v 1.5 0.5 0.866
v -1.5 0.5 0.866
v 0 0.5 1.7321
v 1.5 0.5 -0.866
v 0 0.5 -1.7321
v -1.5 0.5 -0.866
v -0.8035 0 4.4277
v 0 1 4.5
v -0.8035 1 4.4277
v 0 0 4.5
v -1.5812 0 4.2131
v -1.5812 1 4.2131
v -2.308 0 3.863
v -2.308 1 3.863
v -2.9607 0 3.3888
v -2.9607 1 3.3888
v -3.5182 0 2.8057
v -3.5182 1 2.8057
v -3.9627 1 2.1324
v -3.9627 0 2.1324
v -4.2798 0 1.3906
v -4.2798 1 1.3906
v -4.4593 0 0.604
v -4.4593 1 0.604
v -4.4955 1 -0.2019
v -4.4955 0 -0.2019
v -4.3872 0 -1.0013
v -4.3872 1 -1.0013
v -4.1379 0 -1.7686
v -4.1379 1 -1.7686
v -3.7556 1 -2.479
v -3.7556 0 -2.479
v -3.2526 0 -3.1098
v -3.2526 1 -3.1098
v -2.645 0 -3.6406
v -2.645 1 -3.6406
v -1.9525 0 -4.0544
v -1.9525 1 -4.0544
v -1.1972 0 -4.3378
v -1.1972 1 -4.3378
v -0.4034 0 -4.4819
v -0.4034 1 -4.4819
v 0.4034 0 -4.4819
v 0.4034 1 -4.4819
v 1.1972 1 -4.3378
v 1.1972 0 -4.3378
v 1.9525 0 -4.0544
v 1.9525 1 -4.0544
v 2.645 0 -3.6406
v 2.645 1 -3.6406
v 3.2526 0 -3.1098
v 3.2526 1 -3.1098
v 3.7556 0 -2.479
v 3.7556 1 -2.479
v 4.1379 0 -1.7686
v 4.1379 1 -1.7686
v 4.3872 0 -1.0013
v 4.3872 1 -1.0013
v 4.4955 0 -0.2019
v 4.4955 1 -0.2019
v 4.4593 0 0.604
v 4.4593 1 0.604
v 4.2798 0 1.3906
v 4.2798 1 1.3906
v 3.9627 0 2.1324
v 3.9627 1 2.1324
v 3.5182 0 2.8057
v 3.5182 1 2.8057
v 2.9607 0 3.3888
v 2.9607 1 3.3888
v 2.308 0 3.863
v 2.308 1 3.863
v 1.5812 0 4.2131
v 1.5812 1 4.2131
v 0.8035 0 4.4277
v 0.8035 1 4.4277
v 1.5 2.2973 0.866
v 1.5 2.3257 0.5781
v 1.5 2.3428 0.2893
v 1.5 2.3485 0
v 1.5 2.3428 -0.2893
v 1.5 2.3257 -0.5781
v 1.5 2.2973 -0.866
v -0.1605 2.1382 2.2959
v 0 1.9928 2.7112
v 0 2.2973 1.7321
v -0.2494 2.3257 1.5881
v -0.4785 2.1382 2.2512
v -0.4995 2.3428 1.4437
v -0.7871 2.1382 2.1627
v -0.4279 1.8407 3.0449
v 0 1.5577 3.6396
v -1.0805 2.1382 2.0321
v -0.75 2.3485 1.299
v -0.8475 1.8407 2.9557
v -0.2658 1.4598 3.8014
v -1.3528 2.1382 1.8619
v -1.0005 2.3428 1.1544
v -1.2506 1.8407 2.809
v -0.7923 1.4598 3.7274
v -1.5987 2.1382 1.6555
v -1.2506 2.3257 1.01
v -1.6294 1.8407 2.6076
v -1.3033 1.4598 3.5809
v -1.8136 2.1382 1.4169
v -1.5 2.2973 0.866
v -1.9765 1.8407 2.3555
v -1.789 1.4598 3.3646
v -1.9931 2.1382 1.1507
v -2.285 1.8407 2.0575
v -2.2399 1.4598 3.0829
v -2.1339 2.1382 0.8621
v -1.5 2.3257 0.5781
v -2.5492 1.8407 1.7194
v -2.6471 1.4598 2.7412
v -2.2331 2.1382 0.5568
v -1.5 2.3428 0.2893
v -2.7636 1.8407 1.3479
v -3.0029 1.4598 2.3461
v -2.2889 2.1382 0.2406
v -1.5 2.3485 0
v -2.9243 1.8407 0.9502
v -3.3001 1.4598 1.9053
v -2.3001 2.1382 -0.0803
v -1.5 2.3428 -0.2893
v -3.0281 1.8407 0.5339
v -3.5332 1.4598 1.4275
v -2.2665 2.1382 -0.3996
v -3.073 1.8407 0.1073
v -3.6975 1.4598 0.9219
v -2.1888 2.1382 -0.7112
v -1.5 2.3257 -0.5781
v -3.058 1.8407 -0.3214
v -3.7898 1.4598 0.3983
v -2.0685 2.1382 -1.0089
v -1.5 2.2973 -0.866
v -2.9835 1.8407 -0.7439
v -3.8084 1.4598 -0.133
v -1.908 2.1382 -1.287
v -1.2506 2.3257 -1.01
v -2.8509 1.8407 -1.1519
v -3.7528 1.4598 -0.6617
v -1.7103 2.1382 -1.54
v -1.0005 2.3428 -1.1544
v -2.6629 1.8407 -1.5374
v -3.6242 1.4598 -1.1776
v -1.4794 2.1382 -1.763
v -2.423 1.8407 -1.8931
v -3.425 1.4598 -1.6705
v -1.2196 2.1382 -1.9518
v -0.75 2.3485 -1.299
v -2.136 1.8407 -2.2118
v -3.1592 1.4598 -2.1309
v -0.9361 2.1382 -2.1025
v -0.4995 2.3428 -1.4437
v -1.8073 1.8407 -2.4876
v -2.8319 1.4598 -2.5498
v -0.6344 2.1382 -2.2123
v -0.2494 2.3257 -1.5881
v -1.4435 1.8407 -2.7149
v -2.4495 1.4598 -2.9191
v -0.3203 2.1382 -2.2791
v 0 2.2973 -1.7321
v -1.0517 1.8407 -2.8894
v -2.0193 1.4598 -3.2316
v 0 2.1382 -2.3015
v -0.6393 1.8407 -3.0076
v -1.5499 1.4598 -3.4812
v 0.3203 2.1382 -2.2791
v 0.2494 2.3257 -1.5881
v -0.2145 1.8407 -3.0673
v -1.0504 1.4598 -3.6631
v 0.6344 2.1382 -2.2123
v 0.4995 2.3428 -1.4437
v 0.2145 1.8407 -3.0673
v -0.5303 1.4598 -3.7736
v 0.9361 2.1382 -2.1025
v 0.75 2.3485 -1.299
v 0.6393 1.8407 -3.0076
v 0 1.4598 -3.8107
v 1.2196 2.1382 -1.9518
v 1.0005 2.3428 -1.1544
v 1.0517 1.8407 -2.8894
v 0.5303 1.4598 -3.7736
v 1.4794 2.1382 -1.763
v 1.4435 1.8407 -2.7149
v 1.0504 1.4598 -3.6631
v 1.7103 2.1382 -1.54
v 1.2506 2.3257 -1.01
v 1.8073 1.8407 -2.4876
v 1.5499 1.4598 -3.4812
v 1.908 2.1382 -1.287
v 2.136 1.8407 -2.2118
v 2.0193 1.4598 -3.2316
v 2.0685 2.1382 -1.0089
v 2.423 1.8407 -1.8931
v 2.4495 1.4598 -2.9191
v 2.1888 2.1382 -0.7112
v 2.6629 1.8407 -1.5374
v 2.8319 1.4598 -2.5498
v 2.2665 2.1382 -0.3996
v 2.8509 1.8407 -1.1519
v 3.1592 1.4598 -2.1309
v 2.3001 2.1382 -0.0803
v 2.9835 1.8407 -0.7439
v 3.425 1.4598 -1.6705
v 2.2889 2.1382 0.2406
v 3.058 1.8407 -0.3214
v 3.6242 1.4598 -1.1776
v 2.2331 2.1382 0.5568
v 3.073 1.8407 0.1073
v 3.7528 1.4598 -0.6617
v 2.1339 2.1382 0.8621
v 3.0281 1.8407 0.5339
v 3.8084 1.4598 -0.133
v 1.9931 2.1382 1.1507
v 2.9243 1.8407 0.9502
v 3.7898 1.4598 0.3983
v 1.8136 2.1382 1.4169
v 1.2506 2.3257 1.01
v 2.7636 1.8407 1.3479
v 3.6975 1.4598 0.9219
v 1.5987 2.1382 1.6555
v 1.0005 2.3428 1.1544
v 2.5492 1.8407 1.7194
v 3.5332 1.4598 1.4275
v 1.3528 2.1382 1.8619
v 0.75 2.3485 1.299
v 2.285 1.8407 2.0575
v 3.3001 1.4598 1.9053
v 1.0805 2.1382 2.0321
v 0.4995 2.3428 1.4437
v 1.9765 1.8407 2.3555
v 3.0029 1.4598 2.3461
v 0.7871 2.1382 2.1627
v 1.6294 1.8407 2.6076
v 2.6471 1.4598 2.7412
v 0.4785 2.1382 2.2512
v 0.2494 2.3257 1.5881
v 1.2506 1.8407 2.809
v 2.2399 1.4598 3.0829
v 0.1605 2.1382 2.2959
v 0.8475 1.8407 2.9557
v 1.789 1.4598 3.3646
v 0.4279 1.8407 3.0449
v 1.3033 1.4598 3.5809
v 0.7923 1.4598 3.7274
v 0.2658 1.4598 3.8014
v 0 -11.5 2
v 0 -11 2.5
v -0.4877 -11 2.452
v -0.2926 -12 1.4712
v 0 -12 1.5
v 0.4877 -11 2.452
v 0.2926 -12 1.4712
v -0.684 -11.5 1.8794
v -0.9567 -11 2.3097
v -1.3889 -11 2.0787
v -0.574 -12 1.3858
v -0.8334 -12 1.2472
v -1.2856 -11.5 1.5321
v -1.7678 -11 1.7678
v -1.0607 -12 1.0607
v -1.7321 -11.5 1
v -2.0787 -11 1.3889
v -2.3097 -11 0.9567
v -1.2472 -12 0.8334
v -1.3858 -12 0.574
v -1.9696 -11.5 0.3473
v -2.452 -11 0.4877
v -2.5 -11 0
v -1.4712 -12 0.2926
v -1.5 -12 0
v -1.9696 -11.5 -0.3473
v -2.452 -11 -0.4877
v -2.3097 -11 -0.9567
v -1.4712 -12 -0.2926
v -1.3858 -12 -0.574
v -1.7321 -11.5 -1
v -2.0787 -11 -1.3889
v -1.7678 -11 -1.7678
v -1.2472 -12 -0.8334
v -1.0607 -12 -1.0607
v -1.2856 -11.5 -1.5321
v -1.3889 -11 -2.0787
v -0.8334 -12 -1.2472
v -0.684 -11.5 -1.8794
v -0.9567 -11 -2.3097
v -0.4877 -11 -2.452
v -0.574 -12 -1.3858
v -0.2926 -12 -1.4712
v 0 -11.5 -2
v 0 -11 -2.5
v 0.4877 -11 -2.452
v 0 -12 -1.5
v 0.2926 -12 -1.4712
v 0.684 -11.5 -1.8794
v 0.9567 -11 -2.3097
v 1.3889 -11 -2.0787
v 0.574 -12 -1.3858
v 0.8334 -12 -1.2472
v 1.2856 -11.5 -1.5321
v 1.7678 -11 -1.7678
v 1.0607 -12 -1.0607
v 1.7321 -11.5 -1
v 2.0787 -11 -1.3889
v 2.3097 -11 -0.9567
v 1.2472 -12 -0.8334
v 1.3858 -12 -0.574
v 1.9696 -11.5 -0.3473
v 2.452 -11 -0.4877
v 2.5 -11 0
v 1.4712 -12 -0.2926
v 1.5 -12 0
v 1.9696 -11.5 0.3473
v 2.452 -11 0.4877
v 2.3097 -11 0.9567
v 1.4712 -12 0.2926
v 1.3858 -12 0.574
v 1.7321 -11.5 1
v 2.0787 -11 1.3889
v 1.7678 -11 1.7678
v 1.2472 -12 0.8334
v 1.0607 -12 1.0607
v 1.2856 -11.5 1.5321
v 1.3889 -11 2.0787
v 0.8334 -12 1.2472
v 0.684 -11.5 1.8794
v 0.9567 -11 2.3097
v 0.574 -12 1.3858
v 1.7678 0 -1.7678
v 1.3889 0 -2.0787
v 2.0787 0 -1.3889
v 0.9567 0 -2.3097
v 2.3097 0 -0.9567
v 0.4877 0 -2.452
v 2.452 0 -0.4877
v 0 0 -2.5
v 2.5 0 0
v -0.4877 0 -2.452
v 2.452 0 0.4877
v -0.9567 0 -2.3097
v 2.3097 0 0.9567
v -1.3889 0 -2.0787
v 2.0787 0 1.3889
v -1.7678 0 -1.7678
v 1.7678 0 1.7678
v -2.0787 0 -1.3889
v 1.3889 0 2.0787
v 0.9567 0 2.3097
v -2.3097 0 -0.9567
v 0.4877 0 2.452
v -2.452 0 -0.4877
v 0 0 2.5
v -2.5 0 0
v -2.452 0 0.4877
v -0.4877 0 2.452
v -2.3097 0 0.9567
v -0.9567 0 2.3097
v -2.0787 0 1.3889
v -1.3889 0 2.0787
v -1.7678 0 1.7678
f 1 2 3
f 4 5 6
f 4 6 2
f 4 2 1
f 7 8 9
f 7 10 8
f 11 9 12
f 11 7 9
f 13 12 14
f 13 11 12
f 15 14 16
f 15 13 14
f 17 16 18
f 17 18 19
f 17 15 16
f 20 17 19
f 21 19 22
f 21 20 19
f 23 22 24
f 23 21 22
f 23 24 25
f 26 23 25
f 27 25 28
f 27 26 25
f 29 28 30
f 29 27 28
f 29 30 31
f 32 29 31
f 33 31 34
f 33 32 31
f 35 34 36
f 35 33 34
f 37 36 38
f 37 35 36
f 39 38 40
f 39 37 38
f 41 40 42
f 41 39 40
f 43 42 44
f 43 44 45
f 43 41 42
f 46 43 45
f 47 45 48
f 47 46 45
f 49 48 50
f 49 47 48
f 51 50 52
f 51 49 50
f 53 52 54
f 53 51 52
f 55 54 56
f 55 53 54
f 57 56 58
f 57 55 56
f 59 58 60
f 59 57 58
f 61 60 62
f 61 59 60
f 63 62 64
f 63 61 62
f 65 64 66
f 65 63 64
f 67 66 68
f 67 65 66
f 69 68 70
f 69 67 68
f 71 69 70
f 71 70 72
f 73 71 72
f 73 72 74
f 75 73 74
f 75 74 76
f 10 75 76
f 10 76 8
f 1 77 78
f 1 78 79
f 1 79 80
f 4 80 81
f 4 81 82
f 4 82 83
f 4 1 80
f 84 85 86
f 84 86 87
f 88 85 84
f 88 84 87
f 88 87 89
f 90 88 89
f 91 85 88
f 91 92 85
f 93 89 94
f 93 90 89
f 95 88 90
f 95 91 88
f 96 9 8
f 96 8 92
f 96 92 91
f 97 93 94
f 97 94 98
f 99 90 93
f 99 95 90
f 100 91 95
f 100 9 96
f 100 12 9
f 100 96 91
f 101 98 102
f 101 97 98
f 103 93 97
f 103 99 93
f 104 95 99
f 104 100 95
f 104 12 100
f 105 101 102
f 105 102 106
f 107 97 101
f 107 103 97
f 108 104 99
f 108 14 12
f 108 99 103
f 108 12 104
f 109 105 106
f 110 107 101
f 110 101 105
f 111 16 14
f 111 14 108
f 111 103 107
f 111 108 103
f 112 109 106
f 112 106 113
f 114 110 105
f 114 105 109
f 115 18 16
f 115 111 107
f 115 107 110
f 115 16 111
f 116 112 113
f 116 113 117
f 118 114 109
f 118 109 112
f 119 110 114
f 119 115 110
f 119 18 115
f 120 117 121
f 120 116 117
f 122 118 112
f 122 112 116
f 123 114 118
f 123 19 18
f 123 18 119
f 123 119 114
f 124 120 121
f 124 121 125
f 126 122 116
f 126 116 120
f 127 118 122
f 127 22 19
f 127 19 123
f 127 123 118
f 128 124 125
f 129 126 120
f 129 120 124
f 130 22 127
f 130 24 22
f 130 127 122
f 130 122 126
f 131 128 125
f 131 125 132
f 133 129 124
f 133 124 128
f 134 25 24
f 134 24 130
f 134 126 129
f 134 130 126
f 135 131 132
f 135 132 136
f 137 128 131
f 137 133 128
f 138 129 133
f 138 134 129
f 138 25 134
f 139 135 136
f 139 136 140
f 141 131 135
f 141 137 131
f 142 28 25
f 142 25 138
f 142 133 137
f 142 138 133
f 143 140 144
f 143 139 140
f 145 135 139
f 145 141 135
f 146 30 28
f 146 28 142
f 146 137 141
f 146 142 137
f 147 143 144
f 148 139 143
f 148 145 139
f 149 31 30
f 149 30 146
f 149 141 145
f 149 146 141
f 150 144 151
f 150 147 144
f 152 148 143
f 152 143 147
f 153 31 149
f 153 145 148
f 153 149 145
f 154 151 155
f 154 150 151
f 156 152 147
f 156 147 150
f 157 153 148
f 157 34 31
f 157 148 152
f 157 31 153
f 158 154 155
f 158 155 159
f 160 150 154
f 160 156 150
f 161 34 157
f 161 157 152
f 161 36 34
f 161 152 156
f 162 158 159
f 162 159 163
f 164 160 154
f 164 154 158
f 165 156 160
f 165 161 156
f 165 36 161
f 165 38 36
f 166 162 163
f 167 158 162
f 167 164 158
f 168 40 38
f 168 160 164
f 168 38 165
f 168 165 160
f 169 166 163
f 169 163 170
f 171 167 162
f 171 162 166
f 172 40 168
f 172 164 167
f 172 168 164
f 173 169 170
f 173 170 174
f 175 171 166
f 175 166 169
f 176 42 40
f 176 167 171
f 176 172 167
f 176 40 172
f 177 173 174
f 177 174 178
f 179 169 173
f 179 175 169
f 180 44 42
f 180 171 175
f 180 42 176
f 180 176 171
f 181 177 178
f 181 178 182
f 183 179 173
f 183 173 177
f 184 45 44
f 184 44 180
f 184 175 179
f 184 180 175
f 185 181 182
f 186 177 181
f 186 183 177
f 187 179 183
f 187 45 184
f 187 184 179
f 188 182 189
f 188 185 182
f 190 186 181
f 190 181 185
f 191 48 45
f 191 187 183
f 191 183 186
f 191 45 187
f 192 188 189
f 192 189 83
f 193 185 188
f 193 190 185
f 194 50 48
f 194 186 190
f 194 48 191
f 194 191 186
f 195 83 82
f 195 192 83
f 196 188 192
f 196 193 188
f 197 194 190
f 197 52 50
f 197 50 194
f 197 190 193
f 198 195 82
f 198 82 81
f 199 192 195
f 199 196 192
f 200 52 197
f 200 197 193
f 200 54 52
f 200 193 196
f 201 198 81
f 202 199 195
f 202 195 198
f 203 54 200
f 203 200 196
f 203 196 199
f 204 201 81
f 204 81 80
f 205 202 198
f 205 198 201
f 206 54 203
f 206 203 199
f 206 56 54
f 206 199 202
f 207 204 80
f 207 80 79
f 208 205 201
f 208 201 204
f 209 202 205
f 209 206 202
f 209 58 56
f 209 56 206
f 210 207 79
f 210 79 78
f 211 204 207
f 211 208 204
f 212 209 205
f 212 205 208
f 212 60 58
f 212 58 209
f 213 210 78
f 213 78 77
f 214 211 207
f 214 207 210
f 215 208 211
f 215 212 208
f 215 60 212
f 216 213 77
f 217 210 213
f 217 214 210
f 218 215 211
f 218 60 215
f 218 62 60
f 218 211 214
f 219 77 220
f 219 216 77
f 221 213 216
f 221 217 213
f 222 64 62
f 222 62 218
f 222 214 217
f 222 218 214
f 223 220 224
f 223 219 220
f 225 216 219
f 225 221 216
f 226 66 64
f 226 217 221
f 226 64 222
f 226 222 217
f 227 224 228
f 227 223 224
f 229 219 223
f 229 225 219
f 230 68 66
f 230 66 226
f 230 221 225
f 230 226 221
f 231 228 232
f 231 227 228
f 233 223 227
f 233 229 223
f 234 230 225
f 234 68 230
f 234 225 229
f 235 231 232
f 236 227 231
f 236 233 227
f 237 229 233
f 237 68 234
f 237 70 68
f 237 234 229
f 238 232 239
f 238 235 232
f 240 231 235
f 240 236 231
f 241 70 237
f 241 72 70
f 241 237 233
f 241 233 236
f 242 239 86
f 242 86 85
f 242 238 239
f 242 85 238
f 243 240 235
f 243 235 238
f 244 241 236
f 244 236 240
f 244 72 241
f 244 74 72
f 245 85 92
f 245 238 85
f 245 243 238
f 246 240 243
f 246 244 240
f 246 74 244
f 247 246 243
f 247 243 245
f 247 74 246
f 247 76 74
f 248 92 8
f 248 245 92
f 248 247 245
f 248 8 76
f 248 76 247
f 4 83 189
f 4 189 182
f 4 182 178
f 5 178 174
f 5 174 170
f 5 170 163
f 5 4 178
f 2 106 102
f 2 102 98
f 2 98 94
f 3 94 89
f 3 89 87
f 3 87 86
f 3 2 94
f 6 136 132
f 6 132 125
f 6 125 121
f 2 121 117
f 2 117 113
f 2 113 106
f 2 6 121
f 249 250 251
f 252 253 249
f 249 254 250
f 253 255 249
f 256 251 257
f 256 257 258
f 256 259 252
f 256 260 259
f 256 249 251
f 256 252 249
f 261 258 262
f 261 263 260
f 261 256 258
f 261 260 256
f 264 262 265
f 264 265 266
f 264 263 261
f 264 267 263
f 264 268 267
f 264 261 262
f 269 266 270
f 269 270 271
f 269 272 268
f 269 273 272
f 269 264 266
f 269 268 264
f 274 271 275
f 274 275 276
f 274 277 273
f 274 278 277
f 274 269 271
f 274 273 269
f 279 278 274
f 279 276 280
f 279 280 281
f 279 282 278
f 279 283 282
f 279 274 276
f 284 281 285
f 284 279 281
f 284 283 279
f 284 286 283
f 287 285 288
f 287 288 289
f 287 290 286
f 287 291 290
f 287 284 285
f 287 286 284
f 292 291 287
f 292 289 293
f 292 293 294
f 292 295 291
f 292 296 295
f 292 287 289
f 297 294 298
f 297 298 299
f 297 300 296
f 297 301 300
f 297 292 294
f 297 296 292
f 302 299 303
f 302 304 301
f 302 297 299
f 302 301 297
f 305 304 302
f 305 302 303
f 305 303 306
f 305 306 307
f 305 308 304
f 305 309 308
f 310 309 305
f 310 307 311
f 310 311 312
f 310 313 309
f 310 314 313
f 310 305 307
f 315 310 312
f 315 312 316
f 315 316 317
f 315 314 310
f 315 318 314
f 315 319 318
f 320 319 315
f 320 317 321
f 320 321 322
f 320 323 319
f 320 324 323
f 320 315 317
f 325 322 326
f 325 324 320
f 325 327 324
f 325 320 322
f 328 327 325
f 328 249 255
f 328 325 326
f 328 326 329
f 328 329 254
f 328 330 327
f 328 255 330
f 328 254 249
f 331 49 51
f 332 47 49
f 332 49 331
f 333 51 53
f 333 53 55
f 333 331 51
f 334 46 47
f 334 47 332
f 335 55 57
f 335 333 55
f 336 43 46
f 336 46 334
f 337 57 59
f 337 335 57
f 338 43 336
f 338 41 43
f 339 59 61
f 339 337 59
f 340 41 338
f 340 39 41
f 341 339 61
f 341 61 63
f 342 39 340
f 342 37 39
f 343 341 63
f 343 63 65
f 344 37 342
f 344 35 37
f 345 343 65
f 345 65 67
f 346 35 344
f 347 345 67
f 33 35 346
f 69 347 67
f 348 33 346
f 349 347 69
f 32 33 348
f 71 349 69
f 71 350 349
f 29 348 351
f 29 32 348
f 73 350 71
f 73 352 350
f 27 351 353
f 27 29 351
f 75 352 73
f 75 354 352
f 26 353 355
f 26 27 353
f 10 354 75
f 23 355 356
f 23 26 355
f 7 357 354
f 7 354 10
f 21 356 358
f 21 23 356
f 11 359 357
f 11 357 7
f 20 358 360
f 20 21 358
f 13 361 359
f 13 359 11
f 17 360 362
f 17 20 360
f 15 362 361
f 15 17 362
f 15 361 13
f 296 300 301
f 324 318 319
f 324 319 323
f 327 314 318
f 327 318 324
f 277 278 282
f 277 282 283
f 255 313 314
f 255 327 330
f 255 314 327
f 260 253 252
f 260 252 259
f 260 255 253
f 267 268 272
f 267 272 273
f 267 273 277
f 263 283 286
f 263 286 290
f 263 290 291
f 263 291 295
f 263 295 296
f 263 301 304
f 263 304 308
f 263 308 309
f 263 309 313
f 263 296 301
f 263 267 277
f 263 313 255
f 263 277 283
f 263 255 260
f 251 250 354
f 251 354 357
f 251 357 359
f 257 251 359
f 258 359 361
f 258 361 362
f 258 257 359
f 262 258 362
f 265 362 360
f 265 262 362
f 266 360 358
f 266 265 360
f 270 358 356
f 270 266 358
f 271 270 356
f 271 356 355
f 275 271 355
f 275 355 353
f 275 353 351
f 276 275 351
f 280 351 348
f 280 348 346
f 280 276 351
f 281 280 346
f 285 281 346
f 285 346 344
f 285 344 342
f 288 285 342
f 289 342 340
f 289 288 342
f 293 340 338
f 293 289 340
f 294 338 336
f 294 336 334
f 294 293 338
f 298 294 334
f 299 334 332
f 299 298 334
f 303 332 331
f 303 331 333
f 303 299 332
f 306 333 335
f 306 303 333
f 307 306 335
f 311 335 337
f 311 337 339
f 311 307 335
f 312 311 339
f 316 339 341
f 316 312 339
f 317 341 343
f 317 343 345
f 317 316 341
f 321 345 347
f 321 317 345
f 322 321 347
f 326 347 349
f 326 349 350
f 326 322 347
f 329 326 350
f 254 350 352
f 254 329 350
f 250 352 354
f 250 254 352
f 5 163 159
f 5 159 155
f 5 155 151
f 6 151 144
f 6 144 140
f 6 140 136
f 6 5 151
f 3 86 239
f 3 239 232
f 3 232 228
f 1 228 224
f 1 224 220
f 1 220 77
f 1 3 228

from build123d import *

# Parameters (mm, degrees)
ENL_V_START             = 0.5
ENL_V_MAT_EXTRU_1_DEPTH = 3
CHANFREIN1_SIZE         = 1


with BuildPart() as part:
    # Esquisse1 → Révolution1 (revolve)
    with BuildSketch(Plane.XY, mode=Mode.PRIVATE) as r_volution1_sk:
        with BuildLine():
            Line((0, -12), (0, 2.5))
            ThreePointArc((0, 2.5), (-2.371708245, 2.115124735), (-4.5, 1))
            Line((-4.5, 1), (-4.5, 0))
            Line((-4.5, 0), (-2.5, 0))
            Line((-2.5, 0), (-2.5, -12))
            Line((-2.5, -12), (0, -12))
        make_face()
    revolve(r_volution1_sk.sketch.rotate(Axis((0, 16.1829806, 0), (0, -1, 0)), 270), axis=Axis((0, 16.1829806, 0), (0, -1, 0)))  # turned: the seam where the file's is

    # Esquisse2 → Enlèv. mat.-Extru.1 (cut, through all)
    with BuildSketch(Plane(origin=(0, 0, 0), x_dir=(1, 0, 0), z_dir=(0, 1, 0)).offset(ENL_V_START)):
        Polygon((0, 1.732050808), (-1.5, 0.866025404), (-1.5, -0.866025404), (0, -1.732050808), (1.5, -0.866025404), (1.5, 0.866025404), align=None)
    extrude(amount=ENL_V_MAT_EXTRU_1_DEPTH, mode=Mode.SUBTRACT)

    # Chanfrein1
    chanfrein1_edges = [part.edges().sort_by_distance(p)[0] for p in [
        (0, -12, -2.5),
    ]]
    chamfer(chanfrein1_edges, length=CHANFREIN1_SIZE)


solid = part.part
